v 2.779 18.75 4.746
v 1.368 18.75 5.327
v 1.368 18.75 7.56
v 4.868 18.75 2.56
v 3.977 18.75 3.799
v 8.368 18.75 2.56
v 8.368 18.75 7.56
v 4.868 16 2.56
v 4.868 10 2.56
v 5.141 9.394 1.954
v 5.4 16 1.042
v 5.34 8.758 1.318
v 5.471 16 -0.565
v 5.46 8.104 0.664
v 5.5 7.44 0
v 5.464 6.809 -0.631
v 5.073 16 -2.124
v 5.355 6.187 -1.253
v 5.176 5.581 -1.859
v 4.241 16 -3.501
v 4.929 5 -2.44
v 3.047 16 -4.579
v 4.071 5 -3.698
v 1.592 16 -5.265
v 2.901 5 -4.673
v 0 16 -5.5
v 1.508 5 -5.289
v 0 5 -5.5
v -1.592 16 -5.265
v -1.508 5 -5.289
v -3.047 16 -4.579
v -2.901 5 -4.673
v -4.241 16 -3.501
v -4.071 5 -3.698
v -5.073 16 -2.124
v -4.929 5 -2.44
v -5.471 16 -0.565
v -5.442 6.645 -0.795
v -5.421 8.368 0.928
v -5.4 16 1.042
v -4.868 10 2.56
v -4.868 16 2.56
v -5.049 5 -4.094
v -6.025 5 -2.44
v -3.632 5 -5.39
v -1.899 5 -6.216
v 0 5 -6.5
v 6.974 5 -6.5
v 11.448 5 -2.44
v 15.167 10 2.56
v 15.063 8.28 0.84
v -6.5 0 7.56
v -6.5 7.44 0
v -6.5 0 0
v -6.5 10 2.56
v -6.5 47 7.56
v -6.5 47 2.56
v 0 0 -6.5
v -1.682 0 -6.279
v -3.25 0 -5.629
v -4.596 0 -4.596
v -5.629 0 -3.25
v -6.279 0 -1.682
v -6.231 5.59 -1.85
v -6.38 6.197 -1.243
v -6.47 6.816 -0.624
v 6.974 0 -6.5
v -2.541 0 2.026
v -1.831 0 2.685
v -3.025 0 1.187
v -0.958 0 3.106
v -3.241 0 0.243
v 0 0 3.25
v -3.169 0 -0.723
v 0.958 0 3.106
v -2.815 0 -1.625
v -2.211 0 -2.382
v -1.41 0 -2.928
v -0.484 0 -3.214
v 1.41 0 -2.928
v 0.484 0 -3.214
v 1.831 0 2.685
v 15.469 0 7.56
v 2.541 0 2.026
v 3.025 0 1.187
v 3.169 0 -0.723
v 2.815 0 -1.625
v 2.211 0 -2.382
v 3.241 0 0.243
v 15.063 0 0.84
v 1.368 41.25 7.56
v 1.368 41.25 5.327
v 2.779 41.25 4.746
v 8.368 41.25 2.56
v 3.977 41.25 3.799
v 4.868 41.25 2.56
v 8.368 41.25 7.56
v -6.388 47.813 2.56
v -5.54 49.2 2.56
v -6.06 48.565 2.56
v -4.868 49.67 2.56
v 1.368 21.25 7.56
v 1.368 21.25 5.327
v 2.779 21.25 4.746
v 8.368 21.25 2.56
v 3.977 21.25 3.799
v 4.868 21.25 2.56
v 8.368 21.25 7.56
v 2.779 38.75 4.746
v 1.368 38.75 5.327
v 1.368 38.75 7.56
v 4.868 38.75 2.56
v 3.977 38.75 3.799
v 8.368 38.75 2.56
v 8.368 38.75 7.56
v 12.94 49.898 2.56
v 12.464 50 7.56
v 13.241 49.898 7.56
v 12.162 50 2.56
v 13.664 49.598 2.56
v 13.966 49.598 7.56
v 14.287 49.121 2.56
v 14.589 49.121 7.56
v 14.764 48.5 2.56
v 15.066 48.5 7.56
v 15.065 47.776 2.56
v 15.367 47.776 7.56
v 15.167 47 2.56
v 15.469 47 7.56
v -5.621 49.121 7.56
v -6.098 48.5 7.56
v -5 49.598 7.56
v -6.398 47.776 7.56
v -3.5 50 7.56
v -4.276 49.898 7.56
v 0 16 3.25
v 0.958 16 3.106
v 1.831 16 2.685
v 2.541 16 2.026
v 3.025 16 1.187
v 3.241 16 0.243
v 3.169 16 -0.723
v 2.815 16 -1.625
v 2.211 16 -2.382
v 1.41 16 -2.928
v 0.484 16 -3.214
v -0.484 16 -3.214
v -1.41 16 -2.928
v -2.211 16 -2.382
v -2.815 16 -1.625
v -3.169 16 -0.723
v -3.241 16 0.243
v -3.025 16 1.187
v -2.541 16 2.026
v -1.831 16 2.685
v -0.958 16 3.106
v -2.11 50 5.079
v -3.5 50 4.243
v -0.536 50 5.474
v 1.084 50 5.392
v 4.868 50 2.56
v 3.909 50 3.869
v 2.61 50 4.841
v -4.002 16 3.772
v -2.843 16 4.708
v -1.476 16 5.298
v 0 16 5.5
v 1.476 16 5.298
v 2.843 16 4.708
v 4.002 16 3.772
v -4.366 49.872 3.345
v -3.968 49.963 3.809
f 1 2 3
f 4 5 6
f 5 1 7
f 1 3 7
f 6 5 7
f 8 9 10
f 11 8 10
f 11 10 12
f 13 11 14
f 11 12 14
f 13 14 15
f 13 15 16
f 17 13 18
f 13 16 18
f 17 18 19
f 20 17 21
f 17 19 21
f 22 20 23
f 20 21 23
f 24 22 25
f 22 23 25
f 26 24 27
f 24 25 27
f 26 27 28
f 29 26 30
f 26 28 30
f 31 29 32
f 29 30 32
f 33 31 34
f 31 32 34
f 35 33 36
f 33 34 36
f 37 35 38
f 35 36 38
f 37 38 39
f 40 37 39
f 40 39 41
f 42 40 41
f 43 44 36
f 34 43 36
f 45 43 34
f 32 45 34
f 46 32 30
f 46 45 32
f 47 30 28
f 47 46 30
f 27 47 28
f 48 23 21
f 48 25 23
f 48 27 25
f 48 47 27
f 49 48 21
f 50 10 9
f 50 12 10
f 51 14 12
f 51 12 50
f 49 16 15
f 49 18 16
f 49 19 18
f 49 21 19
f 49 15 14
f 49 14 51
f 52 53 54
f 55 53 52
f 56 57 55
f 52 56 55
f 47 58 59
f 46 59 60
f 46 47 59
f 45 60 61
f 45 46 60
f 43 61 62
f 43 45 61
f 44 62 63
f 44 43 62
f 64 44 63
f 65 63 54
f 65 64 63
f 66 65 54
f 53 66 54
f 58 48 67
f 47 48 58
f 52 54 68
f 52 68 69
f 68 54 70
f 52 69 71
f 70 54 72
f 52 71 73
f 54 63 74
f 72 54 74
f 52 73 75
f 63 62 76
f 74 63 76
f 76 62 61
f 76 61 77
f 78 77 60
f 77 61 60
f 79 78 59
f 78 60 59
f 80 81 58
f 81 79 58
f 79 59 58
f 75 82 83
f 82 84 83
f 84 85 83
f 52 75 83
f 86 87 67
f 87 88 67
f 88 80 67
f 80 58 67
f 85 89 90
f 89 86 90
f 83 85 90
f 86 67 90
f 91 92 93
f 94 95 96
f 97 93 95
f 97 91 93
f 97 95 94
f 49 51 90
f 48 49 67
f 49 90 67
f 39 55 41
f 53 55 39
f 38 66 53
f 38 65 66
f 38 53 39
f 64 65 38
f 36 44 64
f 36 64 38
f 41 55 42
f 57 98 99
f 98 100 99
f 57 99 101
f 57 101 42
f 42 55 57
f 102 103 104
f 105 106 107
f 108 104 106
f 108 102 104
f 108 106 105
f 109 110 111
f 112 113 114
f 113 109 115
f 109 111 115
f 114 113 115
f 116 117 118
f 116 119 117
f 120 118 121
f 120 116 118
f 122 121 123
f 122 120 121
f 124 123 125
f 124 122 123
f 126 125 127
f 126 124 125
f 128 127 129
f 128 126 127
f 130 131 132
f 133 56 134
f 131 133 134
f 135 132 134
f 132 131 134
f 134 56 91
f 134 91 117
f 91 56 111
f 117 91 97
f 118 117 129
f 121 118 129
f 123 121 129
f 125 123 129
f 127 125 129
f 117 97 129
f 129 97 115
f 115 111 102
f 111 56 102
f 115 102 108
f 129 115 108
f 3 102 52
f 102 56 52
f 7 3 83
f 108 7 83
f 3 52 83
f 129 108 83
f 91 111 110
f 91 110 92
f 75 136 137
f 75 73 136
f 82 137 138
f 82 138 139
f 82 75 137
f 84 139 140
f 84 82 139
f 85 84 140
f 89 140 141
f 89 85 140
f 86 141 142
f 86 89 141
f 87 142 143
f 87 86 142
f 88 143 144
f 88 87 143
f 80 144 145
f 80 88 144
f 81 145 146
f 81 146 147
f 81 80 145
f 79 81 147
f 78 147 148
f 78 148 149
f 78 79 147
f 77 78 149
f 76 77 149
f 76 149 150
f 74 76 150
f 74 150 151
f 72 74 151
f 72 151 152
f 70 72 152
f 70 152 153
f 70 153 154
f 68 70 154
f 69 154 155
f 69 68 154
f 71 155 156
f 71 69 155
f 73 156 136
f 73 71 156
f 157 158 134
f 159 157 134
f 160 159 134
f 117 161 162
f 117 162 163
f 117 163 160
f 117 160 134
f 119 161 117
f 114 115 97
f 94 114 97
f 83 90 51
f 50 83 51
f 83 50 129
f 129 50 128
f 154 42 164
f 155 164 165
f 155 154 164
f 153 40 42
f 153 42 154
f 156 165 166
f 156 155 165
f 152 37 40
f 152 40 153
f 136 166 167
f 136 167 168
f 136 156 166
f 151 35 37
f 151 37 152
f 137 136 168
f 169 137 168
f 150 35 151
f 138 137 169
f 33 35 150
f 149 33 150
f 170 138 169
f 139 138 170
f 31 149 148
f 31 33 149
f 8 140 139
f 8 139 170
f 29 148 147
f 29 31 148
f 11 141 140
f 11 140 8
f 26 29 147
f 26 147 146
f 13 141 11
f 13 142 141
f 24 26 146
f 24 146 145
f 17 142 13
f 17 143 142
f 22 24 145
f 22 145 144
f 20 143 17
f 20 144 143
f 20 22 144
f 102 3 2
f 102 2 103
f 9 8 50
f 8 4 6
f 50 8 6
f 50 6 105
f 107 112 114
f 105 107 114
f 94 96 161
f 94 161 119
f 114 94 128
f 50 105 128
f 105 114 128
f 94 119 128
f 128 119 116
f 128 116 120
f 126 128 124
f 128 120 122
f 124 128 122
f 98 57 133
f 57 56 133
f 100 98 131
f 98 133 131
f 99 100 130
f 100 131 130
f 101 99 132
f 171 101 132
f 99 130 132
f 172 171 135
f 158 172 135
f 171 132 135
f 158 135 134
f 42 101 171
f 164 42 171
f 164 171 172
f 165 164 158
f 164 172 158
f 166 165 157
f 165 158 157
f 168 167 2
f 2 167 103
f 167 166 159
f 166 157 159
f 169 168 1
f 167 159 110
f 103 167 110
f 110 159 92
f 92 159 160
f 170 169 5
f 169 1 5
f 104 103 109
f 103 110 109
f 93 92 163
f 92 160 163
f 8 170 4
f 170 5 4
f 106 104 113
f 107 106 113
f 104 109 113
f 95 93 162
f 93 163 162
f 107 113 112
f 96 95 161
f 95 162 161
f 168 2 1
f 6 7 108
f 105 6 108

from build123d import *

# Parameters (mm, degrees)
SKETCH1_R               = 3.25
BOSS_EXTRUDE1_DEPTH     = 50
CHAMFER4_SIZE           = 7
CHAMFER4_SIZE2          = 10
SKETCH2_R               = 5.5
CUT_EXTRUDE1_DEPTH      = 45
CUT_EXTRUDE3_DEPTH      = 56.397262251
CUT_EXTRUDE3_DEPTH_BACK = 50
CUT_EXTRUDE4_DEPTH      = 45
CHAMFER5_SIZE           = 5
FILLET1_R               = 3
SKETCH6_R               = 5.5
SKETCH6_R_2             = 3.25
BOSS_EXTRUDE2_DEPTH     = 11
SKETCH9_W               = 7
SKETCH9_H               = 2.5
CUT_EXTRUDE5_DEPTH      = 15


with BuildPart() as part:
    # Sketch1 → Boss-Extrude1 (new body)
    with BuildSketch(Plane(origin=(0, 0, 0), x_dir=(1, 0, 0), z_dir=(0, 1, 0))):
        Polygon((-5.320759509, 8), (-22.469015665, -7.56), (22.469015665, -7.56), (5.320759509, 8), align=None)
        with Locations(Location((0, 0, 0), (0, 0, 270))):
            Circle(SKETCH1_R, mode=Mode.SUBTRACT)
    extrude(amount=BOSS_EXTRUDE1_DEPTH)

    # Chamfer4
    chamfer4_edges = [part.edges().sort_by_distance(p)[0] for p in [
        (22.469015665, 25, 7.56),
    ]]
    chamfer4_side = [part.faces().sort_by_distance(p)[0] for p in [
        (0, 25, 7.56),
    ]]
    chamfer(chamfer4_edges, length=CHAMFER4_SIZE, length2=CHAMFER4_SIZE2, reference=chamfer4_side[0])

    # Sketch2 → Cut-Extrude1 (cut)
    with BuildSketch(Plane(origin=(0, 50, 0), x_dir=(1, 0, 0), z_dir=(0, 1, 0))):
        with Locations(Location((0, 0, 0), (0, 0, 270))):
            Circle(SKETCH2_R)
    extrude(amount=-CUT_EXTRUDE1_DEPTH, mode=Mode.SUBTRACT)

    # Sketch4 → Cut-Extrude3 (cut, two sides: drawn at the far end of the back side and taken through both)
    with BuildSketch(Plane.XZ.offset(-CUT_EXTRUDE3_DEPTH_BACK)):
        with BuildLine():
            Line((-6.5, 0), (-6.5, 8.455296228))
            Line((-6.5, 8.455296228), (-18.092934759, 18.509530088))
            Line((-18.092934759, 18.509530088), (-27.843988074, 13.266508324))
            Line((-27.843988074, 13.266508324), (-26.239796982, -3.957148404))
            Line((-26.239796982, -3.957148404), (-22.051551969, -11.746511534))
            Line((-22.051551969, -11.746511534), (6.44529607, -11.904202977))
            Line((6.44529607, -11.904202977), (12.131507072, -6.5))
            Line((12.131507072, -6.5), (0, -6.5))
            ThreePointArc((0, -6.5), (-4.596194078, -4.596194078), (-6.5, 0))
        make_face()
    extrude(amount=CUT_EXTRUDE3_DEPTH + CUT_EXTRUDE3_DEPTH_BACK, mode=Mode.SUBTRACT)

    # Sketch5 → Cut-Extrude4 (cut)
    with BuildSketch(Plane(origin=(0, 50, 0), x_dir=(1, 0, 0), z_dir=(0, 1, 0))):
        Polygon((0, 0), (4.867894822, -2.56), (20.482845708, -2.56), (8.2569175, 8.380042473), (1.341376292, 8.380042473), (-9.589048862, 8.380042473), (-9.589048862, -2.56), (-4.867894822, -2.56), align=None)
    extrude(amount=-CUT_EXTRUDE4_DEPTH, mode=Mode.SUBTRACT)

    # Chamfer5
    chamfer5_edges = [part.edges().sort_by_distance(p)[0] for p in [
        (10.017520214, 5, 2.56),
        (-5.683947411, 5, 2.56),
    ]]
    chamfer(chamfer5_edges, length=CHAMFER5_SIZE)

    # Fillet1
    fillet1_edges = [part.edges().sort_by_distance(p)[0] for p in [
        (15.318080635, 50, 5.06),
        (-6.5, 50, 5.06),
    ]]
    fillet(fillet1_edges, radius=FILLET1_R)

    # Sketch6 → Boss-Extrude2 (add)
    with BuildSketch(Plane(origin=(0, 5, 0), x_dir=(1, 0, 0), z_dir=(0, 1, 0))):
        Circle(SKETCH6_R)
        with Locations(Location((0, 0, 0), (0, 0, 270))):
            Circle(SKETCH6_R_2, mode=Mode.SUBTRACT)
    extrude(amount=BOSS_EXTRUDE2_DEPTH)

    # Sketch9 → Cut-Extrude5 (cut)
    with BuildSketch(Plane.XY.offset(7.56)):
        with Locations((4.867894822, 40)):
            Rectangle(SKETCH9_W, SKETCH9_H)
        with Locations((4.867894822, 20)):
            Rectangle(SKETCH9_W, SKETCH9_H)
    extrude(amount=-CUT_EXTRUDE5_DEPTH, mode=Mode.SUBTRACT)


solid = part.part
